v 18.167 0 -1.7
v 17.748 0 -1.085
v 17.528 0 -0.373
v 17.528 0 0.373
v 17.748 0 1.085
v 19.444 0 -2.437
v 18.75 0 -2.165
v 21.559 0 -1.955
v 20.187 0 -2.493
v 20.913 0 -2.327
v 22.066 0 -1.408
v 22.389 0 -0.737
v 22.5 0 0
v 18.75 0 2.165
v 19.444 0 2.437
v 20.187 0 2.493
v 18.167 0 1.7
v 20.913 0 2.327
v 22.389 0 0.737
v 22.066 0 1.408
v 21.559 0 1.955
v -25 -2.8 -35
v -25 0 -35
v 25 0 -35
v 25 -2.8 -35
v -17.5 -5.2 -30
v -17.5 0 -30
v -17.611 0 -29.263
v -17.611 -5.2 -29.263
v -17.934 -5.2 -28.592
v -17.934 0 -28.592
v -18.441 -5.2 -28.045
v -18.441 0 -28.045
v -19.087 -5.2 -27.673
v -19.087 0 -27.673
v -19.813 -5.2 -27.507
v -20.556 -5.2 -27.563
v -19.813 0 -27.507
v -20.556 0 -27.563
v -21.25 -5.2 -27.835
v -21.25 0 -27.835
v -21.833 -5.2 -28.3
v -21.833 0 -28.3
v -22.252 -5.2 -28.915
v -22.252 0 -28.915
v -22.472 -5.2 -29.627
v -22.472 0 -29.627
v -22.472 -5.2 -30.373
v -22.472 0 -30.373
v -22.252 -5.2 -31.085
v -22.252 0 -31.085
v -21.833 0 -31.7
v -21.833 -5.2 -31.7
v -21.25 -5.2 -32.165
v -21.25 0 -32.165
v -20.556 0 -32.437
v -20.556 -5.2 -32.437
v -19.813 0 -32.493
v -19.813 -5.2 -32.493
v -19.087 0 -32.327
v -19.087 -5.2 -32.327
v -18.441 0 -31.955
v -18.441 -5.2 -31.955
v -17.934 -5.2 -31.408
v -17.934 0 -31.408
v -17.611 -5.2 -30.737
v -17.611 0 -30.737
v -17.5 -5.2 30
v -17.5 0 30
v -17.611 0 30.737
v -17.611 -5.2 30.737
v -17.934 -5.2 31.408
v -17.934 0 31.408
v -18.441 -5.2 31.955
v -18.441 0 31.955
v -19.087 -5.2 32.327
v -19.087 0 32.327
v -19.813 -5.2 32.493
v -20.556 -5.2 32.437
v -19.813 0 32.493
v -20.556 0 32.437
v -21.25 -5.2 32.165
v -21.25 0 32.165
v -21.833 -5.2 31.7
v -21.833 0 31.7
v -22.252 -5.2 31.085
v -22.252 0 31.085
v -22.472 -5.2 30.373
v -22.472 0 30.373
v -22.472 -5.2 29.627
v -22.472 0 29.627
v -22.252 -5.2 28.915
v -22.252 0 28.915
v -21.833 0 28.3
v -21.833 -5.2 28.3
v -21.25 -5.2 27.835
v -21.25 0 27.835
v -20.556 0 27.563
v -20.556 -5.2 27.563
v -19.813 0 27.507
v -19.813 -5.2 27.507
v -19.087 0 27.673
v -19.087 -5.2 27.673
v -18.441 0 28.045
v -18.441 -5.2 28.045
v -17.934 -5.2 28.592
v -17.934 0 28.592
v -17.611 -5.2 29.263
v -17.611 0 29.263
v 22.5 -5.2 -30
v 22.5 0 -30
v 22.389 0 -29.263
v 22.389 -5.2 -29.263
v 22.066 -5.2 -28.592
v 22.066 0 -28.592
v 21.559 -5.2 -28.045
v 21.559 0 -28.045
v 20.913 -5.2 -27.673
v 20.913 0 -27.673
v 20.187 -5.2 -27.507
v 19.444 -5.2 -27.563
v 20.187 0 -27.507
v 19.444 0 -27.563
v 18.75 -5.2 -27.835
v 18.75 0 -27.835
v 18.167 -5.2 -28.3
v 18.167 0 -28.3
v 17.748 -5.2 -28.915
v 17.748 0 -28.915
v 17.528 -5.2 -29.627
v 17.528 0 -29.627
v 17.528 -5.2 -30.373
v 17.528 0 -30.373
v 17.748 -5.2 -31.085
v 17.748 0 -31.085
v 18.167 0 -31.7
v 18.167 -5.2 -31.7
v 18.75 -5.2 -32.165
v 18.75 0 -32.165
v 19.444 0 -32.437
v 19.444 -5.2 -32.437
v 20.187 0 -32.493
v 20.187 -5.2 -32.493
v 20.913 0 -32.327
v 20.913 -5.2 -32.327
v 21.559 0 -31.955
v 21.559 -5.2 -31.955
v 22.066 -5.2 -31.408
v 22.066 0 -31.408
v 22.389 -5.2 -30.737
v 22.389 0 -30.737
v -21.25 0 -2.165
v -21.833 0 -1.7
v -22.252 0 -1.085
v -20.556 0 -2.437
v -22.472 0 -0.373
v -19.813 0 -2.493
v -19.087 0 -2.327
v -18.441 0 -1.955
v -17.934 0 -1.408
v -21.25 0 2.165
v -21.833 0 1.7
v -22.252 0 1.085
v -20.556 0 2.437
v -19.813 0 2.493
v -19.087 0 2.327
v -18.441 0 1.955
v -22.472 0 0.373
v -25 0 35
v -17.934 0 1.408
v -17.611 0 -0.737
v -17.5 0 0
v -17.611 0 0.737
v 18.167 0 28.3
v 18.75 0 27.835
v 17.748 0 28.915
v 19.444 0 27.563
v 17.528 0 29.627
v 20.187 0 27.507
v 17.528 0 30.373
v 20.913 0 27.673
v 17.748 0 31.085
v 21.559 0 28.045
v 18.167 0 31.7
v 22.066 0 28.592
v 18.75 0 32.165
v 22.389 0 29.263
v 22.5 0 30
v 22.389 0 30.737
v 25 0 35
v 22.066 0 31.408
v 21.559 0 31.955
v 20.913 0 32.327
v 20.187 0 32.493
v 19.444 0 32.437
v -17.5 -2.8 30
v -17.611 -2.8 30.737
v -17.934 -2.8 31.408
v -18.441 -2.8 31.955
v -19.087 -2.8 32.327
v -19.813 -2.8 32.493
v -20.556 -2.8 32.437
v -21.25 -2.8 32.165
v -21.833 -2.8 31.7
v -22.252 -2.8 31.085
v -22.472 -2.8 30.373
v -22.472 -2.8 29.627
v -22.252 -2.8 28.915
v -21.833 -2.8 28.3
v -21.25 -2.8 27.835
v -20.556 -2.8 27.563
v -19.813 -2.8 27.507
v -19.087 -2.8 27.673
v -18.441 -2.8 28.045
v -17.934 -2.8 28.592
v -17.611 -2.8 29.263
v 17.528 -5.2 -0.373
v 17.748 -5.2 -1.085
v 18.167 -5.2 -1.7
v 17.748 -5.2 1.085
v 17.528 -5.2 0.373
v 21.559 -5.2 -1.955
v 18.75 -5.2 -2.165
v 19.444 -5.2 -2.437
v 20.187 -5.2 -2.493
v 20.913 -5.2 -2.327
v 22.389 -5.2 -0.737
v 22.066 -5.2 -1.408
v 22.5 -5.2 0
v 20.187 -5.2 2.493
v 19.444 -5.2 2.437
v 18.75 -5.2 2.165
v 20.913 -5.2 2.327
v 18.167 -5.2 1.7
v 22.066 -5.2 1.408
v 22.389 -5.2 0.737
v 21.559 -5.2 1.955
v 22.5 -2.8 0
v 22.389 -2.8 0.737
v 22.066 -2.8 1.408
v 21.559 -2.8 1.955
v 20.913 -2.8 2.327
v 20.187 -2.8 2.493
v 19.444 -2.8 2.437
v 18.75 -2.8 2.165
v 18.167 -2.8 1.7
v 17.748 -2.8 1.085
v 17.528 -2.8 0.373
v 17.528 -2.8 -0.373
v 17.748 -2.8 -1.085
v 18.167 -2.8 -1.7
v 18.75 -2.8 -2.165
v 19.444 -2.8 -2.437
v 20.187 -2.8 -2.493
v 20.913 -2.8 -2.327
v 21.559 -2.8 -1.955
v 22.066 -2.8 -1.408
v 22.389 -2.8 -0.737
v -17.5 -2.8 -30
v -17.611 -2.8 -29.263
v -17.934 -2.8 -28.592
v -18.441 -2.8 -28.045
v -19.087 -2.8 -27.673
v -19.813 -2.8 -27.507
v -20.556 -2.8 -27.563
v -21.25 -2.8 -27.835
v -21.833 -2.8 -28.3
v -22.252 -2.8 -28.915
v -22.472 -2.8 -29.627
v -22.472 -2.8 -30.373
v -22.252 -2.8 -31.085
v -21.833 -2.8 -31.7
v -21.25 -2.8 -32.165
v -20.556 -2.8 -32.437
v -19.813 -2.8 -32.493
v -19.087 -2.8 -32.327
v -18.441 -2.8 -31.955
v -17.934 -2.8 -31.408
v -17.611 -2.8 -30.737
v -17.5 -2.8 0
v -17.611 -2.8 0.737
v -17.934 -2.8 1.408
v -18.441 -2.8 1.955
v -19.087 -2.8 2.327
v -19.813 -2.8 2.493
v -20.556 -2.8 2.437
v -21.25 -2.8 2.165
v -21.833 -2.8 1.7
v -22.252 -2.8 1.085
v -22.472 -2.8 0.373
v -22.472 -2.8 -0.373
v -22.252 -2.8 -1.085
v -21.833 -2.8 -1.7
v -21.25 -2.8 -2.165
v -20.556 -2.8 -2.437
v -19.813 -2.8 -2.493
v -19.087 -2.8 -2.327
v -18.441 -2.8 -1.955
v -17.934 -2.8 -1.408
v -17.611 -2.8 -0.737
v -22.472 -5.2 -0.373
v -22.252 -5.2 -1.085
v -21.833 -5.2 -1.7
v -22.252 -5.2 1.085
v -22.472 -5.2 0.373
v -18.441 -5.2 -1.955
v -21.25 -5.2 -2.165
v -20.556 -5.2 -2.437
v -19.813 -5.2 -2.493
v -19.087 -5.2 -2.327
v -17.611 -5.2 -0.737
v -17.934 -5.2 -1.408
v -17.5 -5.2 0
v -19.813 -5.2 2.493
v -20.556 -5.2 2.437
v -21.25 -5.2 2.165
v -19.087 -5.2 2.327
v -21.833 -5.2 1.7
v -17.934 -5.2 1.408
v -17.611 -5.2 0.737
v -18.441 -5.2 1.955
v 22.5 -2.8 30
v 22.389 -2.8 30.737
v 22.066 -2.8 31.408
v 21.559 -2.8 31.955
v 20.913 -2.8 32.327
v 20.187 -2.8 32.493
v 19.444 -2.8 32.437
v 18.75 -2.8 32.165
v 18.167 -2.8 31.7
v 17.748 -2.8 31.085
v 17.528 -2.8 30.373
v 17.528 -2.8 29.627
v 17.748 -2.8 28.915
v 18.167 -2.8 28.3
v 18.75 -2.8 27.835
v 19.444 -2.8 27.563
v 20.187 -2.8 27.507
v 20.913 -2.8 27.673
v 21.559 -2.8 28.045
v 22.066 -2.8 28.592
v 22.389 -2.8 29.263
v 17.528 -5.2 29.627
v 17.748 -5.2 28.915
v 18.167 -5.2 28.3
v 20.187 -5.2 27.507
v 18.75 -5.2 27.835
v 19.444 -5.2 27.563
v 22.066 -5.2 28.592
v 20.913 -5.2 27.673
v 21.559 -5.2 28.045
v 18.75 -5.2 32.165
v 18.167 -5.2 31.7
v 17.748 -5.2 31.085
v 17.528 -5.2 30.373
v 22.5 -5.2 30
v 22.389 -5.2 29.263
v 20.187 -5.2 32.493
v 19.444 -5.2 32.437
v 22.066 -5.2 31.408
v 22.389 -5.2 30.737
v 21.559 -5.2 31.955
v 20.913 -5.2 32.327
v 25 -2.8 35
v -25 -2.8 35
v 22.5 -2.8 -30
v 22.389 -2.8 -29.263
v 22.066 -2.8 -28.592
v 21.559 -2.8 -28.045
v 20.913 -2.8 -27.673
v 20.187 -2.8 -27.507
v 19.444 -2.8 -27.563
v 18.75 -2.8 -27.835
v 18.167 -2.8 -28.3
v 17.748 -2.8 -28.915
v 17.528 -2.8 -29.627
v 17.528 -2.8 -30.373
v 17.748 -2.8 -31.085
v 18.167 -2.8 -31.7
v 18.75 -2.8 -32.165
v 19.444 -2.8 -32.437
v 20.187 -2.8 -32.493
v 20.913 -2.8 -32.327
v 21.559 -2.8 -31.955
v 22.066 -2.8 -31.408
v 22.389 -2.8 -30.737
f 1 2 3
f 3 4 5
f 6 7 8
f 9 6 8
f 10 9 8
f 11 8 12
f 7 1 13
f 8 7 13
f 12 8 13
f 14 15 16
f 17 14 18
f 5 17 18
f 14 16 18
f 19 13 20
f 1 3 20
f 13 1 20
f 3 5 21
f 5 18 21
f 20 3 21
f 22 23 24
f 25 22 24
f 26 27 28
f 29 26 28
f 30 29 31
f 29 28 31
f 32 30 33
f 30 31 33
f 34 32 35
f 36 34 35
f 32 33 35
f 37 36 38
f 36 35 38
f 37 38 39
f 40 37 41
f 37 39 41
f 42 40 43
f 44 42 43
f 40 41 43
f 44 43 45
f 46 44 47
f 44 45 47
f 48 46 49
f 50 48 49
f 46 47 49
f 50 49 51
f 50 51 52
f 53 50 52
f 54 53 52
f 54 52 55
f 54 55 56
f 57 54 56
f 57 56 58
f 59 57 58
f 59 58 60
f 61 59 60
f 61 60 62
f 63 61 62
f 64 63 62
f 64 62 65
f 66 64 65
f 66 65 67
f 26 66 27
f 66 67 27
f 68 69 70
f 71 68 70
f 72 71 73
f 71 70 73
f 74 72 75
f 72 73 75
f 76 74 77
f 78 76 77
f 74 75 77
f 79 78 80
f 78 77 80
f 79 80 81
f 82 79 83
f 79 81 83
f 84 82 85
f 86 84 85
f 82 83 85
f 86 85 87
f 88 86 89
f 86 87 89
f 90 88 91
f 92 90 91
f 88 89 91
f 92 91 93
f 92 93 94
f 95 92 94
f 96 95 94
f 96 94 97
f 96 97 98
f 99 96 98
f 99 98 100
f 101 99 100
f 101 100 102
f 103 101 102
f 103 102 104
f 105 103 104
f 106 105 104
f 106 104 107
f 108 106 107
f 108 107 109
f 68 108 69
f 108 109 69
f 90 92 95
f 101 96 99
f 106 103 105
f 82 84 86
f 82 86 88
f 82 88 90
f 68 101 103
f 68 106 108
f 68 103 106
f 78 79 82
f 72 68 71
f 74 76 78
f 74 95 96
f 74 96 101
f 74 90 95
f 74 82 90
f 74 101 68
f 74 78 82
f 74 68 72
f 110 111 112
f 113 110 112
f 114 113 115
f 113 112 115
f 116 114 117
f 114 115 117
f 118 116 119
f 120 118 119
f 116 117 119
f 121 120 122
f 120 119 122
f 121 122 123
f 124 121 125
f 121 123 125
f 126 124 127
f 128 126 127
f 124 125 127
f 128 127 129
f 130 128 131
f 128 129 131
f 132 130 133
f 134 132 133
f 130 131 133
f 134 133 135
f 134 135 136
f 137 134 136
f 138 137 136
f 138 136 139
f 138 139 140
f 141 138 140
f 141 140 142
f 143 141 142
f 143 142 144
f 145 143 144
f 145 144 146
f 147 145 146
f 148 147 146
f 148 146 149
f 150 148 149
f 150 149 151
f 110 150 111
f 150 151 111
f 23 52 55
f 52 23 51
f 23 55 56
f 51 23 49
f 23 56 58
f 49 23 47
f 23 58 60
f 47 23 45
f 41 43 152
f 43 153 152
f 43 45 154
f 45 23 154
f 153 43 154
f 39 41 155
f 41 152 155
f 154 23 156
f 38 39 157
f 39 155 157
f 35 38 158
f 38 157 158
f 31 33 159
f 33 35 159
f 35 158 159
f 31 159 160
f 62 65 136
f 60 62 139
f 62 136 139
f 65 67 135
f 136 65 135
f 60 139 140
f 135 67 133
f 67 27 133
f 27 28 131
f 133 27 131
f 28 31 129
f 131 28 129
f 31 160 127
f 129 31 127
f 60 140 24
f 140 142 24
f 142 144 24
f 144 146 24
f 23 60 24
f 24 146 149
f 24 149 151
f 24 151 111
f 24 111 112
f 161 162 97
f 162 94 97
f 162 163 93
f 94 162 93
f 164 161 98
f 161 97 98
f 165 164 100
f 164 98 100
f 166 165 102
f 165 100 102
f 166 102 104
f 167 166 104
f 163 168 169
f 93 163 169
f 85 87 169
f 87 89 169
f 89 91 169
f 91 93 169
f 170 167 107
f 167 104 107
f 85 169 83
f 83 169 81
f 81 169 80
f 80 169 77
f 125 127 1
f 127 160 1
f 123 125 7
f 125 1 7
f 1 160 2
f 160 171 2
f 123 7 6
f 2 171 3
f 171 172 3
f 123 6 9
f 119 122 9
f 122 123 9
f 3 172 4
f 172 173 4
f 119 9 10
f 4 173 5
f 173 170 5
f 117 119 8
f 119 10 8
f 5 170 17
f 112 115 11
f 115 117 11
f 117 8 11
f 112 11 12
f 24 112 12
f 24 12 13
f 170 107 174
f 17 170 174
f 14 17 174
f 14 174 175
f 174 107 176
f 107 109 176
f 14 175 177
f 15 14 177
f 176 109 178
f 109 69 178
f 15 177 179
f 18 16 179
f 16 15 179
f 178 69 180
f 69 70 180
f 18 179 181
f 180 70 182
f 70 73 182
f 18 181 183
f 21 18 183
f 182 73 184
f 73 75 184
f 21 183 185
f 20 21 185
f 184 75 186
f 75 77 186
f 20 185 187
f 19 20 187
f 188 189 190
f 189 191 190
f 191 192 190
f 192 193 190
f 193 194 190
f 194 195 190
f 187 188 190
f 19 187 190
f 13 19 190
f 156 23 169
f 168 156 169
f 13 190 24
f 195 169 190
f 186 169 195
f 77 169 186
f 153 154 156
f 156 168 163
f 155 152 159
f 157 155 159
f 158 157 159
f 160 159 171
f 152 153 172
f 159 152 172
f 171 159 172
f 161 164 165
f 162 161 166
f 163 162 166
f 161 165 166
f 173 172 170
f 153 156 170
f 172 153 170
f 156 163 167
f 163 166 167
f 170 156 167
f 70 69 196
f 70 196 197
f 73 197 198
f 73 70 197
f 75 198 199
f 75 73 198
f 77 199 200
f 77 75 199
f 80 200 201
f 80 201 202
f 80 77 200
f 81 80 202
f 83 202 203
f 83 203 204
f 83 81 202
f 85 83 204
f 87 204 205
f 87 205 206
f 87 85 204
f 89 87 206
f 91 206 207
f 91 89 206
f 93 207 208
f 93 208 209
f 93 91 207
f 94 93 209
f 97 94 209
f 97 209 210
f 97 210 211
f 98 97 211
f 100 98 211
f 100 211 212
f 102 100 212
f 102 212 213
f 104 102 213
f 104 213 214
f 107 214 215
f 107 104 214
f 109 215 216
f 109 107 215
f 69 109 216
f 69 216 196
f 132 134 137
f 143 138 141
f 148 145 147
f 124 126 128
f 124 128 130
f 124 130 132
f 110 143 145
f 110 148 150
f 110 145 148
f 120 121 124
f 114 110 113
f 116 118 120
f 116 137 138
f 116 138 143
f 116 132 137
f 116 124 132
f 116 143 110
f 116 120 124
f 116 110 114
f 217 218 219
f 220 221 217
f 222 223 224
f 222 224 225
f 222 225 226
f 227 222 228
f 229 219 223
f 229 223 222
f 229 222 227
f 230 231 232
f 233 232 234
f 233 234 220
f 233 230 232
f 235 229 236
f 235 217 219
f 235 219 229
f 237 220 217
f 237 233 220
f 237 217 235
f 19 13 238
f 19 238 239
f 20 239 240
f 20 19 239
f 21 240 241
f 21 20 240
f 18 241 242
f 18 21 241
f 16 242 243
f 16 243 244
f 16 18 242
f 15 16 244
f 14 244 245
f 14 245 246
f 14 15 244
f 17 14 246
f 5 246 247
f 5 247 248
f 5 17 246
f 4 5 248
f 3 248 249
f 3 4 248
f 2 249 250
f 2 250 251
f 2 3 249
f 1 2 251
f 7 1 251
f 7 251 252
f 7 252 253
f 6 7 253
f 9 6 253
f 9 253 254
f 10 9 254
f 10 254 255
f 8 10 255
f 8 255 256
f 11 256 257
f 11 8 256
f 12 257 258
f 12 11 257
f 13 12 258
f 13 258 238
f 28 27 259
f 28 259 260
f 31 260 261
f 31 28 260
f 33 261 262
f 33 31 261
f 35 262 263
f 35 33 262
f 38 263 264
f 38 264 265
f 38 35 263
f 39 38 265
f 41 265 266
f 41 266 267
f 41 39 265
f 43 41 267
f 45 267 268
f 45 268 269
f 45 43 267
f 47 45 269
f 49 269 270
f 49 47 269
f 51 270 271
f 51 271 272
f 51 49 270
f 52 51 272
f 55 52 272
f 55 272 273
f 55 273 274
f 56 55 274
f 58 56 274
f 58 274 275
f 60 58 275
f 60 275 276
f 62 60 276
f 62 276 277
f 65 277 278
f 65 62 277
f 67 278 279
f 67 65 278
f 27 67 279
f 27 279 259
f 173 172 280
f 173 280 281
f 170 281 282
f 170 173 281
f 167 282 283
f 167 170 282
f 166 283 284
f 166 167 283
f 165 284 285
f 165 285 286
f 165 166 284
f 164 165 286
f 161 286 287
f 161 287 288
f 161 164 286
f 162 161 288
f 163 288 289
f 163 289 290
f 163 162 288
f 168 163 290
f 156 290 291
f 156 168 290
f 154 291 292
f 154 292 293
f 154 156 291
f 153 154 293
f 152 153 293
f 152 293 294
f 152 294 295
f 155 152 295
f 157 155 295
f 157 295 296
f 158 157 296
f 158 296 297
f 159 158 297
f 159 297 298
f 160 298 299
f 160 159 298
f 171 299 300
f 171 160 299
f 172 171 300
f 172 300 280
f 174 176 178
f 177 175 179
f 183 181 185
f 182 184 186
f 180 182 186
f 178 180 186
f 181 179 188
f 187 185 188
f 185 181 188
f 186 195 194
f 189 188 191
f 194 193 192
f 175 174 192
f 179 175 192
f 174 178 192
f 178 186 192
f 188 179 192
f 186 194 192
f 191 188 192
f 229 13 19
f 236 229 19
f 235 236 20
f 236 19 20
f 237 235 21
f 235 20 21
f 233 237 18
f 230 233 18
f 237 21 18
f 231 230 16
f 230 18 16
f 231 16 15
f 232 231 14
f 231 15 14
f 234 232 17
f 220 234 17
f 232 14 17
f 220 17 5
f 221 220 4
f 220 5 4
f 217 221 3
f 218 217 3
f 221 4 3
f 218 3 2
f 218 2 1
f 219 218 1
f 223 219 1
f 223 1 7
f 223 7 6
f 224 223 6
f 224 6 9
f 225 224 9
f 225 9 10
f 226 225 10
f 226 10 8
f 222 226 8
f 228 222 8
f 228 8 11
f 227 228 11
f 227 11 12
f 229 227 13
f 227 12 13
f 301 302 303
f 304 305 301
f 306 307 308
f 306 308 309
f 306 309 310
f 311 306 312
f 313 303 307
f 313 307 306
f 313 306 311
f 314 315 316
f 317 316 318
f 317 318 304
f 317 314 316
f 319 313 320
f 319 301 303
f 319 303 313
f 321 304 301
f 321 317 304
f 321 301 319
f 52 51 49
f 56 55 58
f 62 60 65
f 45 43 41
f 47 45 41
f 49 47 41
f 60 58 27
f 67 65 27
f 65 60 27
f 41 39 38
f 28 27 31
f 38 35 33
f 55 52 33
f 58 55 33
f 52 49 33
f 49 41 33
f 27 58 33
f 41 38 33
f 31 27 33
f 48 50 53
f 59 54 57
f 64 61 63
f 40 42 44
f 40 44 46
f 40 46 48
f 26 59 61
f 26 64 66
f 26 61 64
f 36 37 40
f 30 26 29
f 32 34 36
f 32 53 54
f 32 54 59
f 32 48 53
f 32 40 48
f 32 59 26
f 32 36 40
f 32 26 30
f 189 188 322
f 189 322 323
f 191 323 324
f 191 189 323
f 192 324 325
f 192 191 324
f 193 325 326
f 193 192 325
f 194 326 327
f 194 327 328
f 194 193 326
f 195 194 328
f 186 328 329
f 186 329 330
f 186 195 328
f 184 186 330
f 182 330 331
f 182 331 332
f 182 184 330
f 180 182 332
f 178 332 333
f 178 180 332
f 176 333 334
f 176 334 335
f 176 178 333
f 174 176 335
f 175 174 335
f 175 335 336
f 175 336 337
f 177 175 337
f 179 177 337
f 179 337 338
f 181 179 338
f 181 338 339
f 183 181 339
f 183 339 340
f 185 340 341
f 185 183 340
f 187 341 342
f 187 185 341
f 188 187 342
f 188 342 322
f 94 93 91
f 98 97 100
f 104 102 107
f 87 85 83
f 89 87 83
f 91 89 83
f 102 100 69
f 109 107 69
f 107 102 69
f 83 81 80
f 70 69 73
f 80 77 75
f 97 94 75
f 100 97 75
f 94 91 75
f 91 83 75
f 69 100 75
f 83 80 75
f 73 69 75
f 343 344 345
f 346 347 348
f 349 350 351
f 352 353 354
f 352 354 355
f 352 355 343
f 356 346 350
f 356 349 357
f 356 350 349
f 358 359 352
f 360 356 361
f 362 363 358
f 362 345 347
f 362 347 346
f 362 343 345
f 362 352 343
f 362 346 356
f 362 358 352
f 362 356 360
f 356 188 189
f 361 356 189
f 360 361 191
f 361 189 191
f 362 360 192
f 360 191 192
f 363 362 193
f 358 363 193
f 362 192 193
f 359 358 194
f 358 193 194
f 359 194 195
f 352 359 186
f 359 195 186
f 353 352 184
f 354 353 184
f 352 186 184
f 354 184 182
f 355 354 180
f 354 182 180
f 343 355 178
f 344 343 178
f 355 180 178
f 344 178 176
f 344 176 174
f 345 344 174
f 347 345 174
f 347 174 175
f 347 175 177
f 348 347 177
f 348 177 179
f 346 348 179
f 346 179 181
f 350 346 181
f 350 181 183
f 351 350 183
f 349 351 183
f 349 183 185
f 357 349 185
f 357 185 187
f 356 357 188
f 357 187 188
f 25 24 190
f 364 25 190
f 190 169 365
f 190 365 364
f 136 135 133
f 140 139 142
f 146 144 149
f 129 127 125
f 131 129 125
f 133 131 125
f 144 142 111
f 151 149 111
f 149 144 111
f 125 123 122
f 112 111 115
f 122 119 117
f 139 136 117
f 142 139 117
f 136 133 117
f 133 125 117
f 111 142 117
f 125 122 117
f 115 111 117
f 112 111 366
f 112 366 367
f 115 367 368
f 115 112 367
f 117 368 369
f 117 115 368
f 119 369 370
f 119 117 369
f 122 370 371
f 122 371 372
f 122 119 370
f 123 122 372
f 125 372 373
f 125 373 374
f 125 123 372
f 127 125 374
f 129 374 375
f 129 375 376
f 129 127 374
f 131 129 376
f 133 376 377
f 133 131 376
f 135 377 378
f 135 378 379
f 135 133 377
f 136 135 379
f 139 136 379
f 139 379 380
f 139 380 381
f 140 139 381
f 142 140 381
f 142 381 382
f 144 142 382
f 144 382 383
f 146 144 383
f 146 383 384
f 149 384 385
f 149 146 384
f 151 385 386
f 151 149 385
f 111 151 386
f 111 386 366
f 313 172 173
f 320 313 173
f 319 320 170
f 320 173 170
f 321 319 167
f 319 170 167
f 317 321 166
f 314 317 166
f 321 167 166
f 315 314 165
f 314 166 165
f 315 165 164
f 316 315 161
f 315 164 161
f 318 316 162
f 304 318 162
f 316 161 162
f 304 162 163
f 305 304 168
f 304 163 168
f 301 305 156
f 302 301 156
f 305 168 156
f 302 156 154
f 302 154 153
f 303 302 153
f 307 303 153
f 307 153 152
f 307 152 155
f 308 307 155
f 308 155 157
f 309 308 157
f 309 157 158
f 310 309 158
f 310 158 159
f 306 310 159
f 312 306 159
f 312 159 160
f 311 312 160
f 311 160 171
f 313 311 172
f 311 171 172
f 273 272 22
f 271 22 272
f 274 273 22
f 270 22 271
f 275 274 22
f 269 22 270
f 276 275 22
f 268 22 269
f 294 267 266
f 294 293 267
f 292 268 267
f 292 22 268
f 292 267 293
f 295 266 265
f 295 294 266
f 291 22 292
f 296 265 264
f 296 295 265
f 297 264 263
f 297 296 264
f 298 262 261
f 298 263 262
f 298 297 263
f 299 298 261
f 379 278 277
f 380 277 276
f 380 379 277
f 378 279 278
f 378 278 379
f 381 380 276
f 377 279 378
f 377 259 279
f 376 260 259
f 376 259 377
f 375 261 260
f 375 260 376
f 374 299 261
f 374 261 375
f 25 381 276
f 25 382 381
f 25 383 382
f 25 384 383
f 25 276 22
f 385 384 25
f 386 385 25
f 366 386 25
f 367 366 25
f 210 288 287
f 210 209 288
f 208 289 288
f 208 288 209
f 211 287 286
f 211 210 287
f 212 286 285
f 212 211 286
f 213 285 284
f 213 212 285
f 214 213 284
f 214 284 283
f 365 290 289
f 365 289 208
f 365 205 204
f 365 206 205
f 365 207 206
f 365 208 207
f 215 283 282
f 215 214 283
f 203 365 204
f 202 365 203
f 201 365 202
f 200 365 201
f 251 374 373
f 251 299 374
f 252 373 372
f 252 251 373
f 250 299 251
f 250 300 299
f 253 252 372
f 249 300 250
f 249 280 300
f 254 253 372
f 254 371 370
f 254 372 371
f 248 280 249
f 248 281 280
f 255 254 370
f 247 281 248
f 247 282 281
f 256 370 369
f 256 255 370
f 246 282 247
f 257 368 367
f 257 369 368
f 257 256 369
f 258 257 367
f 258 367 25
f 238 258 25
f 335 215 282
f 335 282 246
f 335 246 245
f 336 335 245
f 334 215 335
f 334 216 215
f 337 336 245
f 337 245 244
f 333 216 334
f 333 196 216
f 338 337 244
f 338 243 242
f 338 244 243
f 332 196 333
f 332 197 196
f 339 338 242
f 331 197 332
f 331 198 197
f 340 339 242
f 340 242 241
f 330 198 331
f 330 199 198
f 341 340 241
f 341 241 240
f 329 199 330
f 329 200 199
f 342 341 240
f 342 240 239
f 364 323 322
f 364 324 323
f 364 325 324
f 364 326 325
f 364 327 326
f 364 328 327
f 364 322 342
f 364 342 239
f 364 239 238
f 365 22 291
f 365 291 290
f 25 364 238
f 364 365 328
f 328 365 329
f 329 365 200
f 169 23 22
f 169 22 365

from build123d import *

# Parameters (mm, degrees)
F0_R     = 2.5
F1_DEPTH = 5.2
F0_W     = 50
F0_H     = 70
F2_DEPTH = 2.8


with BuildPart() as f1:
    # F0 (on Front) → F1 (new body)
    with BuildSketch(Plane.XZ):
        with Locations((-20, 30)):
            Circle(F0_R)
        with Locations((20, 30)):
            Circle(F0_R)
        with Locations((20, 0)):
            Circle(F0_R)
        with Locations((-20, 0)):
            Circle(F0_R)
        with Locations((-20, -30)):
            Circle(F0_R)
        with Locations((20, -30)):
            Circle(F0_R)
    extrude(amount=F1_DEPTH)


with BuildPart() as f2:
    # F0 (on Front) → F2 (new body)
    with BuildSketch(Plane.XZ):
        Rectangle(F0_W, F0_H)
        with Locations((-20, -30)):
            Circle(F0_R, mode=Mode.SUBTRACT)
        with Locations((20, -30)):
            Circle(F0_R, mode=Mode.SUBTRACT)
        with Locations((-20, 0)):
            Circle(F0_R, mode=Mode.SUBTRACT)
        with Locations((-20, 30)):
            Circle(F0_R, mode=Mode.SUBTRACT)
        with Locations((20, 0)):
            Circle(F0_R, mode=Mode.SUBTRACT)
        with Locations((20, 30)):
            Circle(F0_R, mode=Mode.SUBTRACT)
    extrude(amount=F2_DEPTH)


solid = Compound([f1.part, f2.part])
